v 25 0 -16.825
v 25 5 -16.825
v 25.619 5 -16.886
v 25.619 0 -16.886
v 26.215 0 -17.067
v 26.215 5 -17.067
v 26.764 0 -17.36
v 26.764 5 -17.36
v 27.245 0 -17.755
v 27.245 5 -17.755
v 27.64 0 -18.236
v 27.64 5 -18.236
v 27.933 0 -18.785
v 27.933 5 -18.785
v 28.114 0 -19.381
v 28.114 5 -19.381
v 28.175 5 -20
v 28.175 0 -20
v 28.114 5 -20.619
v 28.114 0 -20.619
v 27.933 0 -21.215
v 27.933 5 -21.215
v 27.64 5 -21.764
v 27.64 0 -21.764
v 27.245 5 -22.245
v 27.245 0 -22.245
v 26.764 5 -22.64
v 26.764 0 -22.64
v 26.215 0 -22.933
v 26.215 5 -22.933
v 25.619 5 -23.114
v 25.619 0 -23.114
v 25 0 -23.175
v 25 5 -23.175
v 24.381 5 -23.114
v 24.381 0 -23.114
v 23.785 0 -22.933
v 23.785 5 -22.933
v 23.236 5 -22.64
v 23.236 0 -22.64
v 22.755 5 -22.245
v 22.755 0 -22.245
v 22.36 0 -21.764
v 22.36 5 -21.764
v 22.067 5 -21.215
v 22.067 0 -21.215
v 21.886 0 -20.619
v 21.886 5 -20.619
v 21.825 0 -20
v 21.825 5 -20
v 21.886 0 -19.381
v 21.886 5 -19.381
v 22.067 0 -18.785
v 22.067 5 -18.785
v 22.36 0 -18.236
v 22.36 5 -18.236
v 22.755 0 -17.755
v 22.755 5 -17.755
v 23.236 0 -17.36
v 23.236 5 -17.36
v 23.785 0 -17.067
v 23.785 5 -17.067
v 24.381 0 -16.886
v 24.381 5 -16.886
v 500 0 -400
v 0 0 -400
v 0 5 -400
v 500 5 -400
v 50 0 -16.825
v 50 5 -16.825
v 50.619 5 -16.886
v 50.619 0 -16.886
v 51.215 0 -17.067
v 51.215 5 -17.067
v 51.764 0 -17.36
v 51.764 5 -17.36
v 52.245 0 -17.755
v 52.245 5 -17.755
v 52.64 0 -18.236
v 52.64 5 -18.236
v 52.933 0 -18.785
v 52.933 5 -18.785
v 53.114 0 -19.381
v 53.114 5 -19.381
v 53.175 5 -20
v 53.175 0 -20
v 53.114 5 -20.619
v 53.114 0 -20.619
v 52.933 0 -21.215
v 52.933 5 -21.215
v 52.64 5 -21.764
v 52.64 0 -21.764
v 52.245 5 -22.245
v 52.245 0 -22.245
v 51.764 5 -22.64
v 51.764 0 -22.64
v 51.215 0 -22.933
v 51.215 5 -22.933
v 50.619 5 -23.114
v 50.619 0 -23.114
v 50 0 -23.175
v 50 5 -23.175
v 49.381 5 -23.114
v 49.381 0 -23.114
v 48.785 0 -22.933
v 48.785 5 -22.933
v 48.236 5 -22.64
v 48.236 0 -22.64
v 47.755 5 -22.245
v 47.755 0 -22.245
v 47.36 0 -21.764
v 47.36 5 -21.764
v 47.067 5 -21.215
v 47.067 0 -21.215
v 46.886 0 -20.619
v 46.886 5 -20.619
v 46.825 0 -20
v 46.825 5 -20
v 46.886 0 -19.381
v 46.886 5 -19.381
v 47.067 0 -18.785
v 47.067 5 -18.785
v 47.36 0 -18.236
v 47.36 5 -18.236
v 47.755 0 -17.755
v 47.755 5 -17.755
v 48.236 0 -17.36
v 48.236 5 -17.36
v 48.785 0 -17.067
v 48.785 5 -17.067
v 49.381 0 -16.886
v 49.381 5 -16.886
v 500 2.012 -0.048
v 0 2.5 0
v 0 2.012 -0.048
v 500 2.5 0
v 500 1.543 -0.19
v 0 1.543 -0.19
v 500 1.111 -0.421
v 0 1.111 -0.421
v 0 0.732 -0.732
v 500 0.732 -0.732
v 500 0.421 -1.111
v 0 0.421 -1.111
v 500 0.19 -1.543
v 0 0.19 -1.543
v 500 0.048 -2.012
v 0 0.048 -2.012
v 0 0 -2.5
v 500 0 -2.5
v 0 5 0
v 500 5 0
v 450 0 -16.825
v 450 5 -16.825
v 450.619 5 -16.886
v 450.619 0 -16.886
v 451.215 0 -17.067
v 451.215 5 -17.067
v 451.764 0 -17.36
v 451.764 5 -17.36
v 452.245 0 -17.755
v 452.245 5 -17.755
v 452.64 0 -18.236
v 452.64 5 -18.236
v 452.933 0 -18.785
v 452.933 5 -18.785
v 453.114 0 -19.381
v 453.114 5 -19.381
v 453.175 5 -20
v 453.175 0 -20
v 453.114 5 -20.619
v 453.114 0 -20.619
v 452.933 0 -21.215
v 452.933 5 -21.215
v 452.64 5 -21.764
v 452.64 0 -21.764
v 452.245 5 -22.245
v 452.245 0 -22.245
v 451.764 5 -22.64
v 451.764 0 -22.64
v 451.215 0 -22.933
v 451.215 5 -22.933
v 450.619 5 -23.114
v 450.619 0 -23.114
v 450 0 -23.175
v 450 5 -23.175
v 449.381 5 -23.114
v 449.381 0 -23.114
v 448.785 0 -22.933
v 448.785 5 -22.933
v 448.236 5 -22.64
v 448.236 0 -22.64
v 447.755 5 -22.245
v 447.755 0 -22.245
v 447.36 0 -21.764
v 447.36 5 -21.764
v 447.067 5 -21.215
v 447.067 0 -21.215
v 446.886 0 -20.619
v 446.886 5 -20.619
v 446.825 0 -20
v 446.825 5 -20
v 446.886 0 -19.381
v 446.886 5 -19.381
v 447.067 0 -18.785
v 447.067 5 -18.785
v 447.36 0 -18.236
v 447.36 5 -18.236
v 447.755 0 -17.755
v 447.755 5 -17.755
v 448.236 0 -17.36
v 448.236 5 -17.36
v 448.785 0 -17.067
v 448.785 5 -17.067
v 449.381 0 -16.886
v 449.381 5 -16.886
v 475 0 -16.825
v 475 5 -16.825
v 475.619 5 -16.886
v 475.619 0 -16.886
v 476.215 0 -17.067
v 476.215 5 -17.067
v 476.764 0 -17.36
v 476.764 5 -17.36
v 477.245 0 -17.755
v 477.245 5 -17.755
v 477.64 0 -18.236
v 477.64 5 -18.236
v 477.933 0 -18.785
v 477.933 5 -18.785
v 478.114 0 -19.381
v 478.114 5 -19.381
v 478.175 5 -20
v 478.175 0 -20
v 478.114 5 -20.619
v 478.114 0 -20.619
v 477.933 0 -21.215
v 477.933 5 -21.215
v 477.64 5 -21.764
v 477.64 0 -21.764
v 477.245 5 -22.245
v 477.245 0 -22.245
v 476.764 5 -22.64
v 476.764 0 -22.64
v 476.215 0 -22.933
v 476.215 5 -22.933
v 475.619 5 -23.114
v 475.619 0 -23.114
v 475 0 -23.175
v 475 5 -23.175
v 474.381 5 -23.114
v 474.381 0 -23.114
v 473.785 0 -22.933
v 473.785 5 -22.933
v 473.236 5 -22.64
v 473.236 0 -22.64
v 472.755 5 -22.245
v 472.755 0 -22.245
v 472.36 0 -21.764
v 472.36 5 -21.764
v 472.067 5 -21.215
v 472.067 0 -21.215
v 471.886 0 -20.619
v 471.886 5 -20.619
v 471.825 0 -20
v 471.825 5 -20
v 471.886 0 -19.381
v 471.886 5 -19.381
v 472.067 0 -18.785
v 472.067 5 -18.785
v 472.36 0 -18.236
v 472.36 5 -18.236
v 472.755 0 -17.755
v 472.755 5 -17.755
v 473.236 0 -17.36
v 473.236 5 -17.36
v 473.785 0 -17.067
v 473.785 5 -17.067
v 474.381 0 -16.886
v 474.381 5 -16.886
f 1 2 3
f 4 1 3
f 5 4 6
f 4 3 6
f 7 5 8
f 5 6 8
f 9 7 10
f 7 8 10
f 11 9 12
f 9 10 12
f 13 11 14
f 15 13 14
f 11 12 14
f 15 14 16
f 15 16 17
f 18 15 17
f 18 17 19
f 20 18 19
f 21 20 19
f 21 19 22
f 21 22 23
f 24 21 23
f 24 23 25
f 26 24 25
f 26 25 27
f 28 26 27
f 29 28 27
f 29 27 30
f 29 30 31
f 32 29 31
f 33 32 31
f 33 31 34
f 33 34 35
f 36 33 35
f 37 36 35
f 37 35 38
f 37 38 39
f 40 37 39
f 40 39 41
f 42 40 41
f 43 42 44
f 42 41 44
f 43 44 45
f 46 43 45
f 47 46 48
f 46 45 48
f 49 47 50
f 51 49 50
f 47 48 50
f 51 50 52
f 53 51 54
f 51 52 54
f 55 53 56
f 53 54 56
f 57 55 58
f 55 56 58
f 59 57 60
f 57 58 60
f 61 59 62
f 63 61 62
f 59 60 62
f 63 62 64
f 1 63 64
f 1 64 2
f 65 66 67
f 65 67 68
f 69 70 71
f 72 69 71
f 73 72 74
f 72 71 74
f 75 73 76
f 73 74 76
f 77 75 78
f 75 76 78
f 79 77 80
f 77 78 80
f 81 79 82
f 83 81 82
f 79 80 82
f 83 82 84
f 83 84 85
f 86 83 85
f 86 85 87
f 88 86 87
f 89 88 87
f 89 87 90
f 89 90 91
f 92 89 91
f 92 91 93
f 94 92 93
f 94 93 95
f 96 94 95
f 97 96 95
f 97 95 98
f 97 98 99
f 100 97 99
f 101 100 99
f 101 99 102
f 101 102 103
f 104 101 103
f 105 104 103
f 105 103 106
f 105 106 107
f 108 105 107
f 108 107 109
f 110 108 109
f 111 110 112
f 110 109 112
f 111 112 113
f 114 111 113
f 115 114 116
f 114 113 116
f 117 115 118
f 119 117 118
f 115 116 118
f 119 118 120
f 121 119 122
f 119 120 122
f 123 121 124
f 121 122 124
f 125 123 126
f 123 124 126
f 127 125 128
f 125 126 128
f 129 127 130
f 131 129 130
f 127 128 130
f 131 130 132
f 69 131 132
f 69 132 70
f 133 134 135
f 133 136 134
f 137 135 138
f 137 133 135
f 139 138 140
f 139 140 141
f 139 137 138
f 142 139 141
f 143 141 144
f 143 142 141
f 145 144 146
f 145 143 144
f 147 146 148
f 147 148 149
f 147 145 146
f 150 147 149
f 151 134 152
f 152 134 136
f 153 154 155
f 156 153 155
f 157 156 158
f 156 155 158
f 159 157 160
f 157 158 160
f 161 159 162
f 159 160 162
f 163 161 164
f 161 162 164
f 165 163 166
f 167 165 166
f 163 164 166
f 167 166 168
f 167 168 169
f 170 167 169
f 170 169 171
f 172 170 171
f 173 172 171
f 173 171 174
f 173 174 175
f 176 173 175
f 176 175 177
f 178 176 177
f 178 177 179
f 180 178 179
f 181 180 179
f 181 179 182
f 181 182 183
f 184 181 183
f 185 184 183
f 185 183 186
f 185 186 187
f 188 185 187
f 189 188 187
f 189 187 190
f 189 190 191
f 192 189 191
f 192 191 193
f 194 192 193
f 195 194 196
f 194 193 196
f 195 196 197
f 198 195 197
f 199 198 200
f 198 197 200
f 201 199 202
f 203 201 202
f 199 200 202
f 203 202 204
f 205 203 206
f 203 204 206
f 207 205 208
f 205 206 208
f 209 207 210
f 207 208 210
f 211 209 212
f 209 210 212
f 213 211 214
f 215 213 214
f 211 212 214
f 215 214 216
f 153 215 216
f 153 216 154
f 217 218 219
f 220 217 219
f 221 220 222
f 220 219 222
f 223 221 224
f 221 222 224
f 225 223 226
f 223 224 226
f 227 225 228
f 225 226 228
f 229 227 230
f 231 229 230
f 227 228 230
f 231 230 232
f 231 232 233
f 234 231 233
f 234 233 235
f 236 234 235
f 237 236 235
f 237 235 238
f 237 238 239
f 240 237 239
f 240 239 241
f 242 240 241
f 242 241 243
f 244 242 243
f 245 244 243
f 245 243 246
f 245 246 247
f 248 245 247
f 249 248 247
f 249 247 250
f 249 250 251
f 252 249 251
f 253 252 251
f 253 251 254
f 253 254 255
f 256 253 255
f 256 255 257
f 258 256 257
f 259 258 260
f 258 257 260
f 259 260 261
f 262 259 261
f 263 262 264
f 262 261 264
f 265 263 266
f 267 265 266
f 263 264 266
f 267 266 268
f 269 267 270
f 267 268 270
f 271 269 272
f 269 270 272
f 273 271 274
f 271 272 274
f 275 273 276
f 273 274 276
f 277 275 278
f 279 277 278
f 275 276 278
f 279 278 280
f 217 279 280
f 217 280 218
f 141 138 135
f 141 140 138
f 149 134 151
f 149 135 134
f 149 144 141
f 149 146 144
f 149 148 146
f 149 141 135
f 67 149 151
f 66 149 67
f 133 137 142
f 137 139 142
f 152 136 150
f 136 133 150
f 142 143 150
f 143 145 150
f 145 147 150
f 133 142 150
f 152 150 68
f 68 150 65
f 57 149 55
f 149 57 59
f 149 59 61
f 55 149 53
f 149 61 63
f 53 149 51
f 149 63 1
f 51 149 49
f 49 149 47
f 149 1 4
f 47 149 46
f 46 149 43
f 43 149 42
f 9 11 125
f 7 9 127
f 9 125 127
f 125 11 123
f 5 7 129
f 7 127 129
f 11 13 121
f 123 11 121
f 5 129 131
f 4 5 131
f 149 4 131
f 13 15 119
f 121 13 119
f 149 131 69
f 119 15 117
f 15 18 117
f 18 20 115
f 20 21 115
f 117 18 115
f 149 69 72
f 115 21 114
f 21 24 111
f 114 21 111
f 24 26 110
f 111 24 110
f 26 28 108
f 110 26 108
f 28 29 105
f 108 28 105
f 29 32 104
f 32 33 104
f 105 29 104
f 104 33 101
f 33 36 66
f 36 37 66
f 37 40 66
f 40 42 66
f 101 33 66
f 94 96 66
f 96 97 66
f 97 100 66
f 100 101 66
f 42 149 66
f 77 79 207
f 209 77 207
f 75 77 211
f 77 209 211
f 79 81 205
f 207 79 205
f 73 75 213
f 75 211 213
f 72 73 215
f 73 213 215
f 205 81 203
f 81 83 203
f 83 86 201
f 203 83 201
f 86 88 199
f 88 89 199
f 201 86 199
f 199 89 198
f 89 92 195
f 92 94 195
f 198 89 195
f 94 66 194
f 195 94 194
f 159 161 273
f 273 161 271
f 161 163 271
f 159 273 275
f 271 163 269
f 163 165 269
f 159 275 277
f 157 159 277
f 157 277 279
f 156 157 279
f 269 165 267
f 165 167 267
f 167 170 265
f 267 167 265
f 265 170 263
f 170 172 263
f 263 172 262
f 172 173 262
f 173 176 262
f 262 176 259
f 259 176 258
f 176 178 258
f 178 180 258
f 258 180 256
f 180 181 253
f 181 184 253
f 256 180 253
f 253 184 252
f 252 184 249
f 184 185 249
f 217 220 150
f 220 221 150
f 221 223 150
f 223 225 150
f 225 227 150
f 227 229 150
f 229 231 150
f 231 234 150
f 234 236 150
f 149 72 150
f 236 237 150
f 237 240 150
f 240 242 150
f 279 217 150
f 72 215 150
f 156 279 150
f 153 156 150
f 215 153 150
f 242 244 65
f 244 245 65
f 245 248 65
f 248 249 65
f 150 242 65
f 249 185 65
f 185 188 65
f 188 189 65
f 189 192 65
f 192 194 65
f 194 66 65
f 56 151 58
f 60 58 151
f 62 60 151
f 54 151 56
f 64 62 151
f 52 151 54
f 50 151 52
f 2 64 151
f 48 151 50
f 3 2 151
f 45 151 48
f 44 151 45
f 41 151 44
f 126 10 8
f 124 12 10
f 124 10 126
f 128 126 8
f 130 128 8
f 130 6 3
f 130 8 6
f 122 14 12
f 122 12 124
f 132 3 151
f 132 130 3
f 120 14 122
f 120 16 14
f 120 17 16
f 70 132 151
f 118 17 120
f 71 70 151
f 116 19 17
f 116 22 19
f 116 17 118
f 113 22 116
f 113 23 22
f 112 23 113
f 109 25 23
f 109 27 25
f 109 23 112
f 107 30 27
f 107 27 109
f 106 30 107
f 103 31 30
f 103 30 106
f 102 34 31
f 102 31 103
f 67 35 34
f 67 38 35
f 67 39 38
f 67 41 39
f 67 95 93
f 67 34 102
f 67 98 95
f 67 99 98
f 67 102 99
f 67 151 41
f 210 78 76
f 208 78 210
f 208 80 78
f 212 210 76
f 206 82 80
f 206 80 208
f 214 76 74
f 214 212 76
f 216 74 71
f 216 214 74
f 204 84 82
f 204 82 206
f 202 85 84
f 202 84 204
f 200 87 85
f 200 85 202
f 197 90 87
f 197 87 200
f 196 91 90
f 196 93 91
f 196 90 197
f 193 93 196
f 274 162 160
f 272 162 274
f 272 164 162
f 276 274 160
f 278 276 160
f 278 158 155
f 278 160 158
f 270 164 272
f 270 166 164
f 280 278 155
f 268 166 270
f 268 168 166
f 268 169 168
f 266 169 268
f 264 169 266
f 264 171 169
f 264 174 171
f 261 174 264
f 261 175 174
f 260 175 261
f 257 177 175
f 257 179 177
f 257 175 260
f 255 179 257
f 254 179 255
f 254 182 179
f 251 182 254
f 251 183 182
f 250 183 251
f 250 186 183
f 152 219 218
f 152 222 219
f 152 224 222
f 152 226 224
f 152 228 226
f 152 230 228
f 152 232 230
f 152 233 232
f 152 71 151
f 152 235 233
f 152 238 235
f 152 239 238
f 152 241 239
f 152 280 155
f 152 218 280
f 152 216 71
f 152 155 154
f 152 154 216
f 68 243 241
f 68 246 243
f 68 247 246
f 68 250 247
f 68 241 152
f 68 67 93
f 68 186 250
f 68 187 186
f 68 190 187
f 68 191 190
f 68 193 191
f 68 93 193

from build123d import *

# Parameters (mm, degrees)
SKETCH1_W           = 500
SKETCH1_H           = 400
BOSS_EXTRUDE1_DEPTH = 5
SKETCH3_R           = 3.175
CUT_EXTRUDE1_DEPTH  = 10
FILLET1_R           = 2.5


with BuildPart() as part:
    # Sketch1 → Boss-Extrude1 (new body)
    with BuildSketch(Plane(origin=(0, 0, 0), x_dir=(1, 0, 0), z_dir=(0, 1, 0))):
        with Locations((250, 200)):
            Rectangle(SKETCH1_W, SKETCH1_H)
    extrude(amount=BOSS_EXTRUDE1_DEPTH)

    # Sketch3 → Cut-Extrude1 (cut)
    with BuildSketch(Plane(origin=(0, 5, 0), x_dir=(1, 0, 0), z_dir=(0, 1, 0))):
        with Locations(Location((25, 20, 0), (0, 0, 270))):
            Circle(SKETCH3_R)
        with Locations(Location((50, 20, 0), (0, 0, 270))):
            Circle(SKETCH3_R)
        with Locations(Location((475, 20, 0), (0, 0, 270))):
            Circle(SKETCH3_R)
        with Locations(Location((450, 20, 0), (0, 0, 270))):
            Circle(SKETCH3_R)
    extrude(amount=-CUT_EXTRUDE1_DEPTH, mode=Mode.SUBTRACT)

    # Fillet1
    fillet1_edges = [part.edges().sort_by_distance(p)[0] for p in [
        (250, 0, 0),
    ]]
    fillet(fillet1_edges, radius=FILLET1_R)


solid = part.part
